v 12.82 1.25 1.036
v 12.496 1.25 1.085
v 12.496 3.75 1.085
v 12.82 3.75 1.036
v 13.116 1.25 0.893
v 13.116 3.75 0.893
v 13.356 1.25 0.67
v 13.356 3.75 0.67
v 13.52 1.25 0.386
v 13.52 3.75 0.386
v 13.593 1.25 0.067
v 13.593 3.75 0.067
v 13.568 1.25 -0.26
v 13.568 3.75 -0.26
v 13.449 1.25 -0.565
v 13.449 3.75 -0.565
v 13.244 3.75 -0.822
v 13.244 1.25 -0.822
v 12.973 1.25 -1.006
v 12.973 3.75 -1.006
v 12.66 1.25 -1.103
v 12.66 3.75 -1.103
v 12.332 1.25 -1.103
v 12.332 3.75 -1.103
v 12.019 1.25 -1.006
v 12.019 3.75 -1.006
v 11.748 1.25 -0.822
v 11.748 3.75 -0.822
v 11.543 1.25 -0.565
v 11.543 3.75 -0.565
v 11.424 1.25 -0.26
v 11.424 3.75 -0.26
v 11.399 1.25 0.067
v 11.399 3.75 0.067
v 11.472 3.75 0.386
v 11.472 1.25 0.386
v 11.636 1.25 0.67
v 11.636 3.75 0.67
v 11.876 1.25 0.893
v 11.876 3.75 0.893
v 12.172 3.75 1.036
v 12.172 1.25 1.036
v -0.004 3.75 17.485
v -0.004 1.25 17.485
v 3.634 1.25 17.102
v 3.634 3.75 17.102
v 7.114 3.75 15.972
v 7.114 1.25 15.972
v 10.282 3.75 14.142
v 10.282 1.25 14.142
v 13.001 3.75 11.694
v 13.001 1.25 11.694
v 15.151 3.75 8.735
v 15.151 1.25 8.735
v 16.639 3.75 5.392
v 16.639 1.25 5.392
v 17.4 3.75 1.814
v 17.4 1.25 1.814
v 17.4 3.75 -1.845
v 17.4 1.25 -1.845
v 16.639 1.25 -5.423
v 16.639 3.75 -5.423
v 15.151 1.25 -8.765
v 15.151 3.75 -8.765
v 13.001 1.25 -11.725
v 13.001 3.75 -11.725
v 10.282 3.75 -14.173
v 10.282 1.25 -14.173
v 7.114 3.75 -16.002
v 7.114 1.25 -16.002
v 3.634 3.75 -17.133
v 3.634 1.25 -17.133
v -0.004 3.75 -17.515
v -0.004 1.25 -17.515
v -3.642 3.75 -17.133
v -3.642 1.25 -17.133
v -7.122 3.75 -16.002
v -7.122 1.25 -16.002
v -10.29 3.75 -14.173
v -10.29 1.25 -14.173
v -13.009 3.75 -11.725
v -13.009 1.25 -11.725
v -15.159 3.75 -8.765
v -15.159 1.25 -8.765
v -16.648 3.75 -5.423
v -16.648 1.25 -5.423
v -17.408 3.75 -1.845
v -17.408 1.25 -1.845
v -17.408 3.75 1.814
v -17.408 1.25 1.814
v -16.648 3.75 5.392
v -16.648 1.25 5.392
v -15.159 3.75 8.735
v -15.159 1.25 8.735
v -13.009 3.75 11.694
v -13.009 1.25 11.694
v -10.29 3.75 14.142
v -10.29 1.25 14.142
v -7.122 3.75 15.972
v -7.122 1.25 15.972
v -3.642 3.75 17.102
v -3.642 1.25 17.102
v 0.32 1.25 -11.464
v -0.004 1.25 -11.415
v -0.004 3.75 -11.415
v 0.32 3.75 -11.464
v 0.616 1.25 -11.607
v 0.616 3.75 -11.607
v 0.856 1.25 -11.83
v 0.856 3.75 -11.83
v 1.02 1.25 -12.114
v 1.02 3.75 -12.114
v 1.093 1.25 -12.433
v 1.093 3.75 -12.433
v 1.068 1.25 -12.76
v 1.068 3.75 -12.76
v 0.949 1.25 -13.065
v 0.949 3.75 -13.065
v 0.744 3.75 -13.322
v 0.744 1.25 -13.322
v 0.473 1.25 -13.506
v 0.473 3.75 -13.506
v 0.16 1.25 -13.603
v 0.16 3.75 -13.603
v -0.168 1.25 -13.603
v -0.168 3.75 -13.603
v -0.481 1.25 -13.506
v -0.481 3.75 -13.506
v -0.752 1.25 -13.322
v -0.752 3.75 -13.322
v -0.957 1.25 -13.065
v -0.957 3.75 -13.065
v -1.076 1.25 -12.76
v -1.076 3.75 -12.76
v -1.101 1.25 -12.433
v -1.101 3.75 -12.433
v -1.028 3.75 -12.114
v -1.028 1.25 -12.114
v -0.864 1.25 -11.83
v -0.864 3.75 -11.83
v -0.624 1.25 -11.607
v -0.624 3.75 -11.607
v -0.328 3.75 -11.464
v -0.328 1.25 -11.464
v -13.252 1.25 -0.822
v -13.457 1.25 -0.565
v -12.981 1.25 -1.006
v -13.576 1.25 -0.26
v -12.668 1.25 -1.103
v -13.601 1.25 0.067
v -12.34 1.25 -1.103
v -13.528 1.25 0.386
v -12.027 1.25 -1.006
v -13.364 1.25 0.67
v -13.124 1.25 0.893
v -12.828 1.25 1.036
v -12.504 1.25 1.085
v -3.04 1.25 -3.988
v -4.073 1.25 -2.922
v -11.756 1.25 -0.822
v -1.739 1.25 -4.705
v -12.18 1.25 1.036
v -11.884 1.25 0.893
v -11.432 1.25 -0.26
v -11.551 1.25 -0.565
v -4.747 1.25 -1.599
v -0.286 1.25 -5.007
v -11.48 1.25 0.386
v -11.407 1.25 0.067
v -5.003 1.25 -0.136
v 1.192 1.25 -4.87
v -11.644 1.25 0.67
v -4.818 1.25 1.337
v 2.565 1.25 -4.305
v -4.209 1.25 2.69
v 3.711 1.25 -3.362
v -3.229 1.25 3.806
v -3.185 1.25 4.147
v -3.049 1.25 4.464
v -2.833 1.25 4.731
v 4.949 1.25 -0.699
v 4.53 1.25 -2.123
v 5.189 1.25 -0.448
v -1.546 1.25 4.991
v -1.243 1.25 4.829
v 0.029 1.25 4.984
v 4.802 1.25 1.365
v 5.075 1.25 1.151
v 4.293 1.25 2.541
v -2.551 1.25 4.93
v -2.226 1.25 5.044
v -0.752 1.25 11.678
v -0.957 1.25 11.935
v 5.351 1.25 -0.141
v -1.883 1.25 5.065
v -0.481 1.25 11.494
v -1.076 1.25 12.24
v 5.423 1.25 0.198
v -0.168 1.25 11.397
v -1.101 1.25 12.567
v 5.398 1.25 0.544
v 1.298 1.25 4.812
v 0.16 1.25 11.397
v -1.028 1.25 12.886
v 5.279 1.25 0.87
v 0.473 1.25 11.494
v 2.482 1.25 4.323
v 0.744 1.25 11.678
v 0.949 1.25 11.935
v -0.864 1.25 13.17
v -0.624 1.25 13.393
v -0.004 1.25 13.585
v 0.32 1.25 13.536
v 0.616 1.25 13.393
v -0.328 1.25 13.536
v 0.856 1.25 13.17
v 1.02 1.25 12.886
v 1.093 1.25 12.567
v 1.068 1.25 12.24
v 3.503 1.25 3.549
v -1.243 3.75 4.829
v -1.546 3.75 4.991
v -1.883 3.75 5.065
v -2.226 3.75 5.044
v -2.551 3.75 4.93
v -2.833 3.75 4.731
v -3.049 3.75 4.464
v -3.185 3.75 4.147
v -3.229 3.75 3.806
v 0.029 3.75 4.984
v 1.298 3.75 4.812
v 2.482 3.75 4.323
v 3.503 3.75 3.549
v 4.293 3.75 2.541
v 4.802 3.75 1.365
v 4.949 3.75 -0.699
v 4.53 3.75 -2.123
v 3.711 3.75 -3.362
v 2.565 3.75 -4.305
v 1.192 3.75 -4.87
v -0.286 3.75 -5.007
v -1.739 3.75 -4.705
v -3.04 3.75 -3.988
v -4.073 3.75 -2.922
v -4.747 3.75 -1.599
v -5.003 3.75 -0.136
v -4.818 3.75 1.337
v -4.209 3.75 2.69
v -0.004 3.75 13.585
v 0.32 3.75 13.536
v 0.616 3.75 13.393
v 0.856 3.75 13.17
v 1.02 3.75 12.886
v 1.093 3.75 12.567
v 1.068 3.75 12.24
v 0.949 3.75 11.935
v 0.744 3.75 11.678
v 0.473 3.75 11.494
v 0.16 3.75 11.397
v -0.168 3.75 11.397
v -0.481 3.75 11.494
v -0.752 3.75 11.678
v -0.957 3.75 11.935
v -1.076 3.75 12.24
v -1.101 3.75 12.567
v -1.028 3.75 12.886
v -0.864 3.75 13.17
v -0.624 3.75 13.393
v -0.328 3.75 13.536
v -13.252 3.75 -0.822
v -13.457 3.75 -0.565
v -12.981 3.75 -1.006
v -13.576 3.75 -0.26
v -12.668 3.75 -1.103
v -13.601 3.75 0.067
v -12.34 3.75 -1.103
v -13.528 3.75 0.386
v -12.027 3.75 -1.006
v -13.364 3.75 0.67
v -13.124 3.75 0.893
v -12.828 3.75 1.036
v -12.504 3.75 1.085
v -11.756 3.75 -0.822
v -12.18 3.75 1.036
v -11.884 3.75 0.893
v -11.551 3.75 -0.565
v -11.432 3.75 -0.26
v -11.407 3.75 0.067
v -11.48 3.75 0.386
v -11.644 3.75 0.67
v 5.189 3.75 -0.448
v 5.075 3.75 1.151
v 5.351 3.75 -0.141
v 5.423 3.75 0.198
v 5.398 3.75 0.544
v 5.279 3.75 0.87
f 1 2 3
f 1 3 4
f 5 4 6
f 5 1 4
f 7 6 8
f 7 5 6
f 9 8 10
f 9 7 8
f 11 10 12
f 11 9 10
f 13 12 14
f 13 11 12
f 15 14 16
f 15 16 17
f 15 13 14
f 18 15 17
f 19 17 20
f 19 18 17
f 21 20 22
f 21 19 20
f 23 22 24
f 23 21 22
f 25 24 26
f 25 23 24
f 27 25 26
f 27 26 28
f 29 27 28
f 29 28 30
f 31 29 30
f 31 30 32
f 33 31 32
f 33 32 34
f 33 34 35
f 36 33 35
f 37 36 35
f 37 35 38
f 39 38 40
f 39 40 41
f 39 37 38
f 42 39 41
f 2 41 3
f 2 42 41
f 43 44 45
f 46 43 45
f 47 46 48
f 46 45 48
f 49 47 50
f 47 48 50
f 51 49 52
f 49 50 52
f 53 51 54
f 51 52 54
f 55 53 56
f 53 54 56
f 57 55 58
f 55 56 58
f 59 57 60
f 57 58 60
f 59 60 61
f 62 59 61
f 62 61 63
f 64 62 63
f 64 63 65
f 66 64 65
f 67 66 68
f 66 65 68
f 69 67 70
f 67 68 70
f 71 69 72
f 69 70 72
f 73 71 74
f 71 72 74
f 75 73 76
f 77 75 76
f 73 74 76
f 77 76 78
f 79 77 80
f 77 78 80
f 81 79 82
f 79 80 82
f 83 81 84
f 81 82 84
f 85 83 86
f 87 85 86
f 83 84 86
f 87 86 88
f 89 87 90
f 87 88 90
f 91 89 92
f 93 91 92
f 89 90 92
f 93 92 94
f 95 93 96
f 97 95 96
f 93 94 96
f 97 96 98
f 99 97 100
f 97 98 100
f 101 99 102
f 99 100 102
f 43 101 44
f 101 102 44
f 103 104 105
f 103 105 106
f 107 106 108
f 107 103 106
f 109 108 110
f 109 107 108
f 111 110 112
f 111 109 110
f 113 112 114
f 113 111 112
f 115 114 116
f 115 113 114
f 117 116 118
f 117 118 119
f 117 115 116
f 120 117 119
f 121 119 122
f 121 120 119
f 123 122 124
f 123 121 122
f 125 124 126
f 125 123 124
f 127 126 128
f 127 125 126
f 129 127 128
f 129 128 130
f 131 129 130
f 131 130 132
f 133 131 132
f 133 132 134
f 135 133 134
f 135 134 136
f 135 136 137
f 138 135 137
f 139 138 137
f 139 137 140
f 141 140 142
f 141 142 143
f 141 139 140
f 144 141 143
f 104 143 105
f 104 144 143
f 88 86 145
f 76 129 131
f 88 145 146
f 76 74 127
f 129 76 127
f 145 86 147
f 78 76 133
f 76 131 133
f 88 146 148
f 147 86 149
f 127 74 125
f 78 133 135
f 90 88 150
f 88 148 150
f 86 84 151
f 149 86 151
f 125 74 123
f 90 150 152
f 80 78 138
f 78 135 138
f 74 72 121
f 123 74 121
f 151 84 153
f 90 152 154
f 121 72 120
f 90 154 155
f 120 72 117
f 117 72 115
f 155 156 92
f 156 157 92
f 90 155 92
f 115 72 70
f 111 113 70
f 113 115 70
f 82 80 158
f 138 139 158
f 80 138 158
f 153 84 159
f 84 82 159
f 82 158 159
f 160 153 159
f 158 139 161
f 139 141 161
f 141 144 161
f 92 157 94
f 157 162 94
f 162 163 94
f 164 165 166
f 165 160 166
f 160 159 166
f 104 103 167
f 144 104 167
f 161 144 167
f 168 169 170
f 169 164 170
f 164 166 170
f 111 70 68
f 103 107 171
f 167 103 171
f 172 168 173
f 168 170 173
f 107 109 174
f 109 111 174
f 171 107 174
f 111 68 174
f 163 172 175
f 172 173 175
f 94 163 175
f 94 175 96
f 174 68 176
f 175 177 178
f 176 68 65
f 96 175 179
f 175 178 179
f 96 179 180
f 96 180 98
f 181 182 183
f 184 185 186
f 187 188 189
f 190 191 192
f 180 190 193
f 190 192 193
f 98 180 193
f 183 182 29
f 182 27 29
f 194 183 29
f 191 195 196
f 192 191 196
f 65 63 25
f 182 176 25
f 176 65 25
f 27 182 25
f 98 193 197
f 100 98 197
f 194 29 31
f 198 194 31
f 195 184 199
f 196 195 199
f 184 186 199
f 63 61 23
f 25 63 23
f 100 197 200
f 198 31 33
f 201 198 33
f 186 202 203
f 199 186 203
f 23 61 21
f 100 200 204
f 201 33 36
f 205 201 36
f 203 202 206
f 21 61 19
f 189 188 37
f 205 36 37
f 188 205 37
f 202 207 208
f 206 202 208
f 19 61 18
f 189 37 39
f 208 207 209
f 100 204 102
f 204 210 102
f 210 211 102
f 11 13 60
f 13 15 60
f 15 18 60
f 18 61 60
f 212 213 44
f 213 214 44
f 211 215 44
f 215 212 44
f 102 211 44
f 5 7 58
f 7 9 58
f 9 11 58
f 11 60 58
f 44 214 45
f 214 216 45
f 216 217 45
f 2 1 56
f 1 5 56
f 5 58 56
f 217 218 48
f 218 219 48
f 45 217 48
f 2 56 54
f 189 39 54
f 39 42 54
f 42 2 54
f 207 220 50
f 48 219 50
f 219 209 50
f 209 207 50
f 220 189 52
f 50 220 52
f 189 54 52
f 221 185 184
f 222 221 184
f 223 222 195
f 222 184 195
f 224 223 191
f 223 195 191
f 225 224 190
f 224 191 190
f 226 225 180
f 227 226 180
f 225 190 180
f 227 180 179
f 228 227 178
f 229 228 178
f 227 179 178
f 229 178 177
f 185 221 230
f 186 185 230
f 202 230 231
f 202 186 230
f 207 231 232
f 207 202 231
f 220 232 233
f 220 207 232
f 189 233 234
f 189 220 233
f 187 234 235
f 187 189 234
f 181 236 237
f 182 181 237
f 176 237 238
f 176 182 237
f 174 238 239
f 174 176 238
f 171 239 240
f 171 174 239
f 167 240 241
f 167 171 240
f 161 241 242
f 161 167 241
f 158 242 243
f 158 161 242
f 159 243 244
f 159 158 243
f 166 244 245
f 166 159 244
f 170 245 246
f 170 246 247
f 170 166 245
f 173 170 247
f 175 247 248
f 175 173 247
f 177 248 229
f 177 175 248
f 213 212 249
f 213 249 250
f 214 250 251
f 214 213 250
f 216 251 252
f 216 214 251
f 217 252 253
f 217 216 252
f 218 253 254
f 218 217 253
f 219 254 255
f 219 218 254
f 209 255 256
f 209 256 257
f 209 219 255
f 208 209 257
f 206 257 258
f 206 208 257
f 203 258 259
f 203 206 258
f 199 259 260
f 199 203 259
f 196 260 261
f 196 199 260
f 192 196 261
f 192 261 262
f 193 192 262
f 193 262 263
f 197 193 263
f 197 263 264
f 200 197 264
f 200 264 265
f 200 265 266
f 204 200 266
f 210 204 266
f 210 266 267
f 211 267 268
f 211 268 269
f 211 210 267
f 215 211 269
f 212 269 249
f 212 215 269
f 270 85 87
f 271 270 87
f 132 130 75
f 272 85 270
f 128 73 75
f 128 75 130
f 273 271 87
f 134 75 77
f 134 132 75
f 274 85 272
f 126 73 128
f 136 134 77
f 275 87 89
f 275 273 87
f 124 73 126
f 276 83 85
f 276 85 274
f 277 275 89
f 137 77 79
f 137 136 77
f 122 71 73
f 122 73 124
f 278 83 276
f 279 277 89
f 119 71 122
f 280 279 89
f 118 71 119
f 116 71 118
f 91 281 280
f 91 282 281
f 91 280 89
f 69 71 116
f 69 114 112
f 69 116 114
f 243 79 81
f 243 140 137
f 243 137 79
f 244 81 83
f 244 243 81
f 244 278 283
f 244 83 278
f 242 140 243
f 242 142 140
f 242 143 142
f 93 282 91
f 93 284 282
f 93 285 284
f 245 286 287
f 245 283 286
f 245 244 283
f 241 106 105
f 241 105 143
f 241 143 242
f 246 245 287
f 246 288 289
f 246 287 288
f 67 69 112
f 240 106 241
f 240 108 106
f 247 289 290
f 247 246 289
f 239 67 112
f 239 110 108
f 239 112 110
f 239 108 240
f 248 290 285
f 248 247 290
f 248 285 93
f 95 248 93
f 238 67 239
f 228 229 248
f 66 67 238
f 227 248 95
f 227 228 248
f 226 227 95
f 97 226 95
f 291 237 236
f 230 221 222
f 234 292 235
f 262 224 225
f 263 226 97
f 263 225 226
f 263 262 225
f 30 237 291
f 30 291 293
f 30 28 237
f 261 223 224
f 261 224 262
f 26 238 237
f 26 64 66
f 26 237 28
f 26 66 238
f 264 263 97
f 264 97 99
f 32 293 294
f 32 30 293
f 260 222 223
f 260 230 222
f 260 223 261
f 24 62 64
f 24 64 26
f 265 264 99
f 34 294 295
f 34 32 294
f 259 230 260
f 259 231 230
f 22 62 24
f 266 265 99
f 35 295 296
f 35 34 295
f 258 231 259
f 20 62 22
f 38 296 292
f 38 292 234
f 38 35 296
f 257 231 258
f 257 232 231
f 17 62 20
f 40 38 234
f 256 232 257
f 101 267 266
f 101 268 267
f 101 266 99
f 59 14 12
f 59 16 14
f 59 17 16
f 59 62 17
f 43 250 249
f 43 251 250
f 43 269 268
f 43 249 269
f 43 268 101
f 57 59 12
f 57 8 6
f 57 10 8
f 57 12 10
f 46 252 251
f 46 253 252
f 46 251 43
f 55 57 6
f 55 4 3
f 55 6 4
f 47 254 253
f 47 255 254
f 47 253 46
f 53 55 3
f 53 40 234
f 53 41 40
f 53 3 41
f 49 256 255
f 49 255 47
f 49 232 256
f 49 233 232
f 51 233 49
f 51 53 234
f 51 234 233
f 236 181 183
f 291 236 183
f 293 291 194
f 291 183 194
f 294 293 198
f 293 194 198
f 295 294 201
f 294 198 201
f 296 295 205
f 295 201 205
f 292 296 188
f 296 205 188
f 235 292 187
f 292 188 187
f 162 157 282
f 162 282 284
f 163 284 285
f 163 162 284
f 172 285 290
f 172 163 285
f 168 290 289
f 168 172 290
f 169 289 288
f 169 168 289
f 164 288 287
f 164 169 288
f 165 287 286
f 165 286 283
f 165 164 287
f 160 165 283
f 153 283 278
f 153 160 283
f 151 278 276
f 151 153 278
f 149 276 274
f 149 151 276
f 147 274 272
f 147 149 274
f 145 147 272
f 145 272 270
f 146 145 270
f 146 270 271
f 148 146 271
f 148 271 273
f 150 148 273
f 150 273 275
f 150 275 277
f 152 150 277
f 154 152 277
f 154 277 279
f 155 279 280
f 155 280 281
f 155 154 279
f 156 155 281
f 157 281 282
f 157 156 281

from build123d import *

# Parameters (mm, degrees)
SKETCH1_R               = 35
SKETCH1_R_2             = 2.2
SKETCH1_R_3             = 10
BOSS_EXTRUDE1_DEPTH     = 5
ECHELLE2_SCALE          = 2
ESQUISSE3_R             = 5
ENL_V_MAT_EXTRU_1_DEPTH = 10
ECHELLE3_SCALE          = 0.25


with BuildPart() as part:
    # Sketch1 → Boss-Extrude1 (new body)
    with BuildSketch(Plane(origin=(0, 0, 0), x_dir=(1, 0, 0), z_dir=(0, 1, 0))):
        with Locations(Location((0, 0, 0), (0, 0, 270))):
            Circle(SKETCH1_R)
        with Locations(Location((0, 25, 0), (0, 0, 270))):
            Circle(SKETCH1_R_2, mode=Mode.SUBTRACT)
        with Locations(Location((25, 0, 0), (0, 0, 270))):
            Circle(SKETCH1_R_2, mode=Mode.SUBTRACT)
        with Locations(Location((0, -25, 0), (0, 0, 270))):
            Circle(SKETCH1_R_2, mode=Mode.SUBTRACT)
        with Locations(Location((-25, 0, 0), (0, 0, 270))):
            Circle(SKETCH1_R_2, mode=Mode.SUBTRACT)
        with Locations(Location((0, 0, 0), (0, 0, 270))):
            Circle(SKETCH1_R_3, mode=Mode.SUBTRACT)
    extrude(amount=BOSS_EXTRUDE1_DEPTH)


with BuildPart() as part_1:
    # Echelle2: scaled about (0, 2.5, 0)
    add(part.part.scale(ECHELLE2_SCALE).moved(Location((0, -2.5, 0))))

    # Esquisse3 → Enlèv. mat.-Extru.1 (cut)
    with BuildSketch(Plane.XZ.offset(2.5)):
        with Locations((16.717937413, 1.193862082)):
            Circle(ESQUISSE3_R)
        with Locations((-7.898828439, 15.335211041)):
            Circle(ESQUISSE3_R)
    extrude(amount=-ENL_V_MAT_EXTRU_1_DEPTH, mode=Mode.SUBTRACT)


with BuildPart() as part_2:
    # Echelle3: scaled about (-0.005350728, 2.5, -0.020561043)
    add(part_1.part.scale(ECHELLE3_SCALE).moved(Location((-0.004013046, 1.875, -0.015420782))))


solid = part_2.part
